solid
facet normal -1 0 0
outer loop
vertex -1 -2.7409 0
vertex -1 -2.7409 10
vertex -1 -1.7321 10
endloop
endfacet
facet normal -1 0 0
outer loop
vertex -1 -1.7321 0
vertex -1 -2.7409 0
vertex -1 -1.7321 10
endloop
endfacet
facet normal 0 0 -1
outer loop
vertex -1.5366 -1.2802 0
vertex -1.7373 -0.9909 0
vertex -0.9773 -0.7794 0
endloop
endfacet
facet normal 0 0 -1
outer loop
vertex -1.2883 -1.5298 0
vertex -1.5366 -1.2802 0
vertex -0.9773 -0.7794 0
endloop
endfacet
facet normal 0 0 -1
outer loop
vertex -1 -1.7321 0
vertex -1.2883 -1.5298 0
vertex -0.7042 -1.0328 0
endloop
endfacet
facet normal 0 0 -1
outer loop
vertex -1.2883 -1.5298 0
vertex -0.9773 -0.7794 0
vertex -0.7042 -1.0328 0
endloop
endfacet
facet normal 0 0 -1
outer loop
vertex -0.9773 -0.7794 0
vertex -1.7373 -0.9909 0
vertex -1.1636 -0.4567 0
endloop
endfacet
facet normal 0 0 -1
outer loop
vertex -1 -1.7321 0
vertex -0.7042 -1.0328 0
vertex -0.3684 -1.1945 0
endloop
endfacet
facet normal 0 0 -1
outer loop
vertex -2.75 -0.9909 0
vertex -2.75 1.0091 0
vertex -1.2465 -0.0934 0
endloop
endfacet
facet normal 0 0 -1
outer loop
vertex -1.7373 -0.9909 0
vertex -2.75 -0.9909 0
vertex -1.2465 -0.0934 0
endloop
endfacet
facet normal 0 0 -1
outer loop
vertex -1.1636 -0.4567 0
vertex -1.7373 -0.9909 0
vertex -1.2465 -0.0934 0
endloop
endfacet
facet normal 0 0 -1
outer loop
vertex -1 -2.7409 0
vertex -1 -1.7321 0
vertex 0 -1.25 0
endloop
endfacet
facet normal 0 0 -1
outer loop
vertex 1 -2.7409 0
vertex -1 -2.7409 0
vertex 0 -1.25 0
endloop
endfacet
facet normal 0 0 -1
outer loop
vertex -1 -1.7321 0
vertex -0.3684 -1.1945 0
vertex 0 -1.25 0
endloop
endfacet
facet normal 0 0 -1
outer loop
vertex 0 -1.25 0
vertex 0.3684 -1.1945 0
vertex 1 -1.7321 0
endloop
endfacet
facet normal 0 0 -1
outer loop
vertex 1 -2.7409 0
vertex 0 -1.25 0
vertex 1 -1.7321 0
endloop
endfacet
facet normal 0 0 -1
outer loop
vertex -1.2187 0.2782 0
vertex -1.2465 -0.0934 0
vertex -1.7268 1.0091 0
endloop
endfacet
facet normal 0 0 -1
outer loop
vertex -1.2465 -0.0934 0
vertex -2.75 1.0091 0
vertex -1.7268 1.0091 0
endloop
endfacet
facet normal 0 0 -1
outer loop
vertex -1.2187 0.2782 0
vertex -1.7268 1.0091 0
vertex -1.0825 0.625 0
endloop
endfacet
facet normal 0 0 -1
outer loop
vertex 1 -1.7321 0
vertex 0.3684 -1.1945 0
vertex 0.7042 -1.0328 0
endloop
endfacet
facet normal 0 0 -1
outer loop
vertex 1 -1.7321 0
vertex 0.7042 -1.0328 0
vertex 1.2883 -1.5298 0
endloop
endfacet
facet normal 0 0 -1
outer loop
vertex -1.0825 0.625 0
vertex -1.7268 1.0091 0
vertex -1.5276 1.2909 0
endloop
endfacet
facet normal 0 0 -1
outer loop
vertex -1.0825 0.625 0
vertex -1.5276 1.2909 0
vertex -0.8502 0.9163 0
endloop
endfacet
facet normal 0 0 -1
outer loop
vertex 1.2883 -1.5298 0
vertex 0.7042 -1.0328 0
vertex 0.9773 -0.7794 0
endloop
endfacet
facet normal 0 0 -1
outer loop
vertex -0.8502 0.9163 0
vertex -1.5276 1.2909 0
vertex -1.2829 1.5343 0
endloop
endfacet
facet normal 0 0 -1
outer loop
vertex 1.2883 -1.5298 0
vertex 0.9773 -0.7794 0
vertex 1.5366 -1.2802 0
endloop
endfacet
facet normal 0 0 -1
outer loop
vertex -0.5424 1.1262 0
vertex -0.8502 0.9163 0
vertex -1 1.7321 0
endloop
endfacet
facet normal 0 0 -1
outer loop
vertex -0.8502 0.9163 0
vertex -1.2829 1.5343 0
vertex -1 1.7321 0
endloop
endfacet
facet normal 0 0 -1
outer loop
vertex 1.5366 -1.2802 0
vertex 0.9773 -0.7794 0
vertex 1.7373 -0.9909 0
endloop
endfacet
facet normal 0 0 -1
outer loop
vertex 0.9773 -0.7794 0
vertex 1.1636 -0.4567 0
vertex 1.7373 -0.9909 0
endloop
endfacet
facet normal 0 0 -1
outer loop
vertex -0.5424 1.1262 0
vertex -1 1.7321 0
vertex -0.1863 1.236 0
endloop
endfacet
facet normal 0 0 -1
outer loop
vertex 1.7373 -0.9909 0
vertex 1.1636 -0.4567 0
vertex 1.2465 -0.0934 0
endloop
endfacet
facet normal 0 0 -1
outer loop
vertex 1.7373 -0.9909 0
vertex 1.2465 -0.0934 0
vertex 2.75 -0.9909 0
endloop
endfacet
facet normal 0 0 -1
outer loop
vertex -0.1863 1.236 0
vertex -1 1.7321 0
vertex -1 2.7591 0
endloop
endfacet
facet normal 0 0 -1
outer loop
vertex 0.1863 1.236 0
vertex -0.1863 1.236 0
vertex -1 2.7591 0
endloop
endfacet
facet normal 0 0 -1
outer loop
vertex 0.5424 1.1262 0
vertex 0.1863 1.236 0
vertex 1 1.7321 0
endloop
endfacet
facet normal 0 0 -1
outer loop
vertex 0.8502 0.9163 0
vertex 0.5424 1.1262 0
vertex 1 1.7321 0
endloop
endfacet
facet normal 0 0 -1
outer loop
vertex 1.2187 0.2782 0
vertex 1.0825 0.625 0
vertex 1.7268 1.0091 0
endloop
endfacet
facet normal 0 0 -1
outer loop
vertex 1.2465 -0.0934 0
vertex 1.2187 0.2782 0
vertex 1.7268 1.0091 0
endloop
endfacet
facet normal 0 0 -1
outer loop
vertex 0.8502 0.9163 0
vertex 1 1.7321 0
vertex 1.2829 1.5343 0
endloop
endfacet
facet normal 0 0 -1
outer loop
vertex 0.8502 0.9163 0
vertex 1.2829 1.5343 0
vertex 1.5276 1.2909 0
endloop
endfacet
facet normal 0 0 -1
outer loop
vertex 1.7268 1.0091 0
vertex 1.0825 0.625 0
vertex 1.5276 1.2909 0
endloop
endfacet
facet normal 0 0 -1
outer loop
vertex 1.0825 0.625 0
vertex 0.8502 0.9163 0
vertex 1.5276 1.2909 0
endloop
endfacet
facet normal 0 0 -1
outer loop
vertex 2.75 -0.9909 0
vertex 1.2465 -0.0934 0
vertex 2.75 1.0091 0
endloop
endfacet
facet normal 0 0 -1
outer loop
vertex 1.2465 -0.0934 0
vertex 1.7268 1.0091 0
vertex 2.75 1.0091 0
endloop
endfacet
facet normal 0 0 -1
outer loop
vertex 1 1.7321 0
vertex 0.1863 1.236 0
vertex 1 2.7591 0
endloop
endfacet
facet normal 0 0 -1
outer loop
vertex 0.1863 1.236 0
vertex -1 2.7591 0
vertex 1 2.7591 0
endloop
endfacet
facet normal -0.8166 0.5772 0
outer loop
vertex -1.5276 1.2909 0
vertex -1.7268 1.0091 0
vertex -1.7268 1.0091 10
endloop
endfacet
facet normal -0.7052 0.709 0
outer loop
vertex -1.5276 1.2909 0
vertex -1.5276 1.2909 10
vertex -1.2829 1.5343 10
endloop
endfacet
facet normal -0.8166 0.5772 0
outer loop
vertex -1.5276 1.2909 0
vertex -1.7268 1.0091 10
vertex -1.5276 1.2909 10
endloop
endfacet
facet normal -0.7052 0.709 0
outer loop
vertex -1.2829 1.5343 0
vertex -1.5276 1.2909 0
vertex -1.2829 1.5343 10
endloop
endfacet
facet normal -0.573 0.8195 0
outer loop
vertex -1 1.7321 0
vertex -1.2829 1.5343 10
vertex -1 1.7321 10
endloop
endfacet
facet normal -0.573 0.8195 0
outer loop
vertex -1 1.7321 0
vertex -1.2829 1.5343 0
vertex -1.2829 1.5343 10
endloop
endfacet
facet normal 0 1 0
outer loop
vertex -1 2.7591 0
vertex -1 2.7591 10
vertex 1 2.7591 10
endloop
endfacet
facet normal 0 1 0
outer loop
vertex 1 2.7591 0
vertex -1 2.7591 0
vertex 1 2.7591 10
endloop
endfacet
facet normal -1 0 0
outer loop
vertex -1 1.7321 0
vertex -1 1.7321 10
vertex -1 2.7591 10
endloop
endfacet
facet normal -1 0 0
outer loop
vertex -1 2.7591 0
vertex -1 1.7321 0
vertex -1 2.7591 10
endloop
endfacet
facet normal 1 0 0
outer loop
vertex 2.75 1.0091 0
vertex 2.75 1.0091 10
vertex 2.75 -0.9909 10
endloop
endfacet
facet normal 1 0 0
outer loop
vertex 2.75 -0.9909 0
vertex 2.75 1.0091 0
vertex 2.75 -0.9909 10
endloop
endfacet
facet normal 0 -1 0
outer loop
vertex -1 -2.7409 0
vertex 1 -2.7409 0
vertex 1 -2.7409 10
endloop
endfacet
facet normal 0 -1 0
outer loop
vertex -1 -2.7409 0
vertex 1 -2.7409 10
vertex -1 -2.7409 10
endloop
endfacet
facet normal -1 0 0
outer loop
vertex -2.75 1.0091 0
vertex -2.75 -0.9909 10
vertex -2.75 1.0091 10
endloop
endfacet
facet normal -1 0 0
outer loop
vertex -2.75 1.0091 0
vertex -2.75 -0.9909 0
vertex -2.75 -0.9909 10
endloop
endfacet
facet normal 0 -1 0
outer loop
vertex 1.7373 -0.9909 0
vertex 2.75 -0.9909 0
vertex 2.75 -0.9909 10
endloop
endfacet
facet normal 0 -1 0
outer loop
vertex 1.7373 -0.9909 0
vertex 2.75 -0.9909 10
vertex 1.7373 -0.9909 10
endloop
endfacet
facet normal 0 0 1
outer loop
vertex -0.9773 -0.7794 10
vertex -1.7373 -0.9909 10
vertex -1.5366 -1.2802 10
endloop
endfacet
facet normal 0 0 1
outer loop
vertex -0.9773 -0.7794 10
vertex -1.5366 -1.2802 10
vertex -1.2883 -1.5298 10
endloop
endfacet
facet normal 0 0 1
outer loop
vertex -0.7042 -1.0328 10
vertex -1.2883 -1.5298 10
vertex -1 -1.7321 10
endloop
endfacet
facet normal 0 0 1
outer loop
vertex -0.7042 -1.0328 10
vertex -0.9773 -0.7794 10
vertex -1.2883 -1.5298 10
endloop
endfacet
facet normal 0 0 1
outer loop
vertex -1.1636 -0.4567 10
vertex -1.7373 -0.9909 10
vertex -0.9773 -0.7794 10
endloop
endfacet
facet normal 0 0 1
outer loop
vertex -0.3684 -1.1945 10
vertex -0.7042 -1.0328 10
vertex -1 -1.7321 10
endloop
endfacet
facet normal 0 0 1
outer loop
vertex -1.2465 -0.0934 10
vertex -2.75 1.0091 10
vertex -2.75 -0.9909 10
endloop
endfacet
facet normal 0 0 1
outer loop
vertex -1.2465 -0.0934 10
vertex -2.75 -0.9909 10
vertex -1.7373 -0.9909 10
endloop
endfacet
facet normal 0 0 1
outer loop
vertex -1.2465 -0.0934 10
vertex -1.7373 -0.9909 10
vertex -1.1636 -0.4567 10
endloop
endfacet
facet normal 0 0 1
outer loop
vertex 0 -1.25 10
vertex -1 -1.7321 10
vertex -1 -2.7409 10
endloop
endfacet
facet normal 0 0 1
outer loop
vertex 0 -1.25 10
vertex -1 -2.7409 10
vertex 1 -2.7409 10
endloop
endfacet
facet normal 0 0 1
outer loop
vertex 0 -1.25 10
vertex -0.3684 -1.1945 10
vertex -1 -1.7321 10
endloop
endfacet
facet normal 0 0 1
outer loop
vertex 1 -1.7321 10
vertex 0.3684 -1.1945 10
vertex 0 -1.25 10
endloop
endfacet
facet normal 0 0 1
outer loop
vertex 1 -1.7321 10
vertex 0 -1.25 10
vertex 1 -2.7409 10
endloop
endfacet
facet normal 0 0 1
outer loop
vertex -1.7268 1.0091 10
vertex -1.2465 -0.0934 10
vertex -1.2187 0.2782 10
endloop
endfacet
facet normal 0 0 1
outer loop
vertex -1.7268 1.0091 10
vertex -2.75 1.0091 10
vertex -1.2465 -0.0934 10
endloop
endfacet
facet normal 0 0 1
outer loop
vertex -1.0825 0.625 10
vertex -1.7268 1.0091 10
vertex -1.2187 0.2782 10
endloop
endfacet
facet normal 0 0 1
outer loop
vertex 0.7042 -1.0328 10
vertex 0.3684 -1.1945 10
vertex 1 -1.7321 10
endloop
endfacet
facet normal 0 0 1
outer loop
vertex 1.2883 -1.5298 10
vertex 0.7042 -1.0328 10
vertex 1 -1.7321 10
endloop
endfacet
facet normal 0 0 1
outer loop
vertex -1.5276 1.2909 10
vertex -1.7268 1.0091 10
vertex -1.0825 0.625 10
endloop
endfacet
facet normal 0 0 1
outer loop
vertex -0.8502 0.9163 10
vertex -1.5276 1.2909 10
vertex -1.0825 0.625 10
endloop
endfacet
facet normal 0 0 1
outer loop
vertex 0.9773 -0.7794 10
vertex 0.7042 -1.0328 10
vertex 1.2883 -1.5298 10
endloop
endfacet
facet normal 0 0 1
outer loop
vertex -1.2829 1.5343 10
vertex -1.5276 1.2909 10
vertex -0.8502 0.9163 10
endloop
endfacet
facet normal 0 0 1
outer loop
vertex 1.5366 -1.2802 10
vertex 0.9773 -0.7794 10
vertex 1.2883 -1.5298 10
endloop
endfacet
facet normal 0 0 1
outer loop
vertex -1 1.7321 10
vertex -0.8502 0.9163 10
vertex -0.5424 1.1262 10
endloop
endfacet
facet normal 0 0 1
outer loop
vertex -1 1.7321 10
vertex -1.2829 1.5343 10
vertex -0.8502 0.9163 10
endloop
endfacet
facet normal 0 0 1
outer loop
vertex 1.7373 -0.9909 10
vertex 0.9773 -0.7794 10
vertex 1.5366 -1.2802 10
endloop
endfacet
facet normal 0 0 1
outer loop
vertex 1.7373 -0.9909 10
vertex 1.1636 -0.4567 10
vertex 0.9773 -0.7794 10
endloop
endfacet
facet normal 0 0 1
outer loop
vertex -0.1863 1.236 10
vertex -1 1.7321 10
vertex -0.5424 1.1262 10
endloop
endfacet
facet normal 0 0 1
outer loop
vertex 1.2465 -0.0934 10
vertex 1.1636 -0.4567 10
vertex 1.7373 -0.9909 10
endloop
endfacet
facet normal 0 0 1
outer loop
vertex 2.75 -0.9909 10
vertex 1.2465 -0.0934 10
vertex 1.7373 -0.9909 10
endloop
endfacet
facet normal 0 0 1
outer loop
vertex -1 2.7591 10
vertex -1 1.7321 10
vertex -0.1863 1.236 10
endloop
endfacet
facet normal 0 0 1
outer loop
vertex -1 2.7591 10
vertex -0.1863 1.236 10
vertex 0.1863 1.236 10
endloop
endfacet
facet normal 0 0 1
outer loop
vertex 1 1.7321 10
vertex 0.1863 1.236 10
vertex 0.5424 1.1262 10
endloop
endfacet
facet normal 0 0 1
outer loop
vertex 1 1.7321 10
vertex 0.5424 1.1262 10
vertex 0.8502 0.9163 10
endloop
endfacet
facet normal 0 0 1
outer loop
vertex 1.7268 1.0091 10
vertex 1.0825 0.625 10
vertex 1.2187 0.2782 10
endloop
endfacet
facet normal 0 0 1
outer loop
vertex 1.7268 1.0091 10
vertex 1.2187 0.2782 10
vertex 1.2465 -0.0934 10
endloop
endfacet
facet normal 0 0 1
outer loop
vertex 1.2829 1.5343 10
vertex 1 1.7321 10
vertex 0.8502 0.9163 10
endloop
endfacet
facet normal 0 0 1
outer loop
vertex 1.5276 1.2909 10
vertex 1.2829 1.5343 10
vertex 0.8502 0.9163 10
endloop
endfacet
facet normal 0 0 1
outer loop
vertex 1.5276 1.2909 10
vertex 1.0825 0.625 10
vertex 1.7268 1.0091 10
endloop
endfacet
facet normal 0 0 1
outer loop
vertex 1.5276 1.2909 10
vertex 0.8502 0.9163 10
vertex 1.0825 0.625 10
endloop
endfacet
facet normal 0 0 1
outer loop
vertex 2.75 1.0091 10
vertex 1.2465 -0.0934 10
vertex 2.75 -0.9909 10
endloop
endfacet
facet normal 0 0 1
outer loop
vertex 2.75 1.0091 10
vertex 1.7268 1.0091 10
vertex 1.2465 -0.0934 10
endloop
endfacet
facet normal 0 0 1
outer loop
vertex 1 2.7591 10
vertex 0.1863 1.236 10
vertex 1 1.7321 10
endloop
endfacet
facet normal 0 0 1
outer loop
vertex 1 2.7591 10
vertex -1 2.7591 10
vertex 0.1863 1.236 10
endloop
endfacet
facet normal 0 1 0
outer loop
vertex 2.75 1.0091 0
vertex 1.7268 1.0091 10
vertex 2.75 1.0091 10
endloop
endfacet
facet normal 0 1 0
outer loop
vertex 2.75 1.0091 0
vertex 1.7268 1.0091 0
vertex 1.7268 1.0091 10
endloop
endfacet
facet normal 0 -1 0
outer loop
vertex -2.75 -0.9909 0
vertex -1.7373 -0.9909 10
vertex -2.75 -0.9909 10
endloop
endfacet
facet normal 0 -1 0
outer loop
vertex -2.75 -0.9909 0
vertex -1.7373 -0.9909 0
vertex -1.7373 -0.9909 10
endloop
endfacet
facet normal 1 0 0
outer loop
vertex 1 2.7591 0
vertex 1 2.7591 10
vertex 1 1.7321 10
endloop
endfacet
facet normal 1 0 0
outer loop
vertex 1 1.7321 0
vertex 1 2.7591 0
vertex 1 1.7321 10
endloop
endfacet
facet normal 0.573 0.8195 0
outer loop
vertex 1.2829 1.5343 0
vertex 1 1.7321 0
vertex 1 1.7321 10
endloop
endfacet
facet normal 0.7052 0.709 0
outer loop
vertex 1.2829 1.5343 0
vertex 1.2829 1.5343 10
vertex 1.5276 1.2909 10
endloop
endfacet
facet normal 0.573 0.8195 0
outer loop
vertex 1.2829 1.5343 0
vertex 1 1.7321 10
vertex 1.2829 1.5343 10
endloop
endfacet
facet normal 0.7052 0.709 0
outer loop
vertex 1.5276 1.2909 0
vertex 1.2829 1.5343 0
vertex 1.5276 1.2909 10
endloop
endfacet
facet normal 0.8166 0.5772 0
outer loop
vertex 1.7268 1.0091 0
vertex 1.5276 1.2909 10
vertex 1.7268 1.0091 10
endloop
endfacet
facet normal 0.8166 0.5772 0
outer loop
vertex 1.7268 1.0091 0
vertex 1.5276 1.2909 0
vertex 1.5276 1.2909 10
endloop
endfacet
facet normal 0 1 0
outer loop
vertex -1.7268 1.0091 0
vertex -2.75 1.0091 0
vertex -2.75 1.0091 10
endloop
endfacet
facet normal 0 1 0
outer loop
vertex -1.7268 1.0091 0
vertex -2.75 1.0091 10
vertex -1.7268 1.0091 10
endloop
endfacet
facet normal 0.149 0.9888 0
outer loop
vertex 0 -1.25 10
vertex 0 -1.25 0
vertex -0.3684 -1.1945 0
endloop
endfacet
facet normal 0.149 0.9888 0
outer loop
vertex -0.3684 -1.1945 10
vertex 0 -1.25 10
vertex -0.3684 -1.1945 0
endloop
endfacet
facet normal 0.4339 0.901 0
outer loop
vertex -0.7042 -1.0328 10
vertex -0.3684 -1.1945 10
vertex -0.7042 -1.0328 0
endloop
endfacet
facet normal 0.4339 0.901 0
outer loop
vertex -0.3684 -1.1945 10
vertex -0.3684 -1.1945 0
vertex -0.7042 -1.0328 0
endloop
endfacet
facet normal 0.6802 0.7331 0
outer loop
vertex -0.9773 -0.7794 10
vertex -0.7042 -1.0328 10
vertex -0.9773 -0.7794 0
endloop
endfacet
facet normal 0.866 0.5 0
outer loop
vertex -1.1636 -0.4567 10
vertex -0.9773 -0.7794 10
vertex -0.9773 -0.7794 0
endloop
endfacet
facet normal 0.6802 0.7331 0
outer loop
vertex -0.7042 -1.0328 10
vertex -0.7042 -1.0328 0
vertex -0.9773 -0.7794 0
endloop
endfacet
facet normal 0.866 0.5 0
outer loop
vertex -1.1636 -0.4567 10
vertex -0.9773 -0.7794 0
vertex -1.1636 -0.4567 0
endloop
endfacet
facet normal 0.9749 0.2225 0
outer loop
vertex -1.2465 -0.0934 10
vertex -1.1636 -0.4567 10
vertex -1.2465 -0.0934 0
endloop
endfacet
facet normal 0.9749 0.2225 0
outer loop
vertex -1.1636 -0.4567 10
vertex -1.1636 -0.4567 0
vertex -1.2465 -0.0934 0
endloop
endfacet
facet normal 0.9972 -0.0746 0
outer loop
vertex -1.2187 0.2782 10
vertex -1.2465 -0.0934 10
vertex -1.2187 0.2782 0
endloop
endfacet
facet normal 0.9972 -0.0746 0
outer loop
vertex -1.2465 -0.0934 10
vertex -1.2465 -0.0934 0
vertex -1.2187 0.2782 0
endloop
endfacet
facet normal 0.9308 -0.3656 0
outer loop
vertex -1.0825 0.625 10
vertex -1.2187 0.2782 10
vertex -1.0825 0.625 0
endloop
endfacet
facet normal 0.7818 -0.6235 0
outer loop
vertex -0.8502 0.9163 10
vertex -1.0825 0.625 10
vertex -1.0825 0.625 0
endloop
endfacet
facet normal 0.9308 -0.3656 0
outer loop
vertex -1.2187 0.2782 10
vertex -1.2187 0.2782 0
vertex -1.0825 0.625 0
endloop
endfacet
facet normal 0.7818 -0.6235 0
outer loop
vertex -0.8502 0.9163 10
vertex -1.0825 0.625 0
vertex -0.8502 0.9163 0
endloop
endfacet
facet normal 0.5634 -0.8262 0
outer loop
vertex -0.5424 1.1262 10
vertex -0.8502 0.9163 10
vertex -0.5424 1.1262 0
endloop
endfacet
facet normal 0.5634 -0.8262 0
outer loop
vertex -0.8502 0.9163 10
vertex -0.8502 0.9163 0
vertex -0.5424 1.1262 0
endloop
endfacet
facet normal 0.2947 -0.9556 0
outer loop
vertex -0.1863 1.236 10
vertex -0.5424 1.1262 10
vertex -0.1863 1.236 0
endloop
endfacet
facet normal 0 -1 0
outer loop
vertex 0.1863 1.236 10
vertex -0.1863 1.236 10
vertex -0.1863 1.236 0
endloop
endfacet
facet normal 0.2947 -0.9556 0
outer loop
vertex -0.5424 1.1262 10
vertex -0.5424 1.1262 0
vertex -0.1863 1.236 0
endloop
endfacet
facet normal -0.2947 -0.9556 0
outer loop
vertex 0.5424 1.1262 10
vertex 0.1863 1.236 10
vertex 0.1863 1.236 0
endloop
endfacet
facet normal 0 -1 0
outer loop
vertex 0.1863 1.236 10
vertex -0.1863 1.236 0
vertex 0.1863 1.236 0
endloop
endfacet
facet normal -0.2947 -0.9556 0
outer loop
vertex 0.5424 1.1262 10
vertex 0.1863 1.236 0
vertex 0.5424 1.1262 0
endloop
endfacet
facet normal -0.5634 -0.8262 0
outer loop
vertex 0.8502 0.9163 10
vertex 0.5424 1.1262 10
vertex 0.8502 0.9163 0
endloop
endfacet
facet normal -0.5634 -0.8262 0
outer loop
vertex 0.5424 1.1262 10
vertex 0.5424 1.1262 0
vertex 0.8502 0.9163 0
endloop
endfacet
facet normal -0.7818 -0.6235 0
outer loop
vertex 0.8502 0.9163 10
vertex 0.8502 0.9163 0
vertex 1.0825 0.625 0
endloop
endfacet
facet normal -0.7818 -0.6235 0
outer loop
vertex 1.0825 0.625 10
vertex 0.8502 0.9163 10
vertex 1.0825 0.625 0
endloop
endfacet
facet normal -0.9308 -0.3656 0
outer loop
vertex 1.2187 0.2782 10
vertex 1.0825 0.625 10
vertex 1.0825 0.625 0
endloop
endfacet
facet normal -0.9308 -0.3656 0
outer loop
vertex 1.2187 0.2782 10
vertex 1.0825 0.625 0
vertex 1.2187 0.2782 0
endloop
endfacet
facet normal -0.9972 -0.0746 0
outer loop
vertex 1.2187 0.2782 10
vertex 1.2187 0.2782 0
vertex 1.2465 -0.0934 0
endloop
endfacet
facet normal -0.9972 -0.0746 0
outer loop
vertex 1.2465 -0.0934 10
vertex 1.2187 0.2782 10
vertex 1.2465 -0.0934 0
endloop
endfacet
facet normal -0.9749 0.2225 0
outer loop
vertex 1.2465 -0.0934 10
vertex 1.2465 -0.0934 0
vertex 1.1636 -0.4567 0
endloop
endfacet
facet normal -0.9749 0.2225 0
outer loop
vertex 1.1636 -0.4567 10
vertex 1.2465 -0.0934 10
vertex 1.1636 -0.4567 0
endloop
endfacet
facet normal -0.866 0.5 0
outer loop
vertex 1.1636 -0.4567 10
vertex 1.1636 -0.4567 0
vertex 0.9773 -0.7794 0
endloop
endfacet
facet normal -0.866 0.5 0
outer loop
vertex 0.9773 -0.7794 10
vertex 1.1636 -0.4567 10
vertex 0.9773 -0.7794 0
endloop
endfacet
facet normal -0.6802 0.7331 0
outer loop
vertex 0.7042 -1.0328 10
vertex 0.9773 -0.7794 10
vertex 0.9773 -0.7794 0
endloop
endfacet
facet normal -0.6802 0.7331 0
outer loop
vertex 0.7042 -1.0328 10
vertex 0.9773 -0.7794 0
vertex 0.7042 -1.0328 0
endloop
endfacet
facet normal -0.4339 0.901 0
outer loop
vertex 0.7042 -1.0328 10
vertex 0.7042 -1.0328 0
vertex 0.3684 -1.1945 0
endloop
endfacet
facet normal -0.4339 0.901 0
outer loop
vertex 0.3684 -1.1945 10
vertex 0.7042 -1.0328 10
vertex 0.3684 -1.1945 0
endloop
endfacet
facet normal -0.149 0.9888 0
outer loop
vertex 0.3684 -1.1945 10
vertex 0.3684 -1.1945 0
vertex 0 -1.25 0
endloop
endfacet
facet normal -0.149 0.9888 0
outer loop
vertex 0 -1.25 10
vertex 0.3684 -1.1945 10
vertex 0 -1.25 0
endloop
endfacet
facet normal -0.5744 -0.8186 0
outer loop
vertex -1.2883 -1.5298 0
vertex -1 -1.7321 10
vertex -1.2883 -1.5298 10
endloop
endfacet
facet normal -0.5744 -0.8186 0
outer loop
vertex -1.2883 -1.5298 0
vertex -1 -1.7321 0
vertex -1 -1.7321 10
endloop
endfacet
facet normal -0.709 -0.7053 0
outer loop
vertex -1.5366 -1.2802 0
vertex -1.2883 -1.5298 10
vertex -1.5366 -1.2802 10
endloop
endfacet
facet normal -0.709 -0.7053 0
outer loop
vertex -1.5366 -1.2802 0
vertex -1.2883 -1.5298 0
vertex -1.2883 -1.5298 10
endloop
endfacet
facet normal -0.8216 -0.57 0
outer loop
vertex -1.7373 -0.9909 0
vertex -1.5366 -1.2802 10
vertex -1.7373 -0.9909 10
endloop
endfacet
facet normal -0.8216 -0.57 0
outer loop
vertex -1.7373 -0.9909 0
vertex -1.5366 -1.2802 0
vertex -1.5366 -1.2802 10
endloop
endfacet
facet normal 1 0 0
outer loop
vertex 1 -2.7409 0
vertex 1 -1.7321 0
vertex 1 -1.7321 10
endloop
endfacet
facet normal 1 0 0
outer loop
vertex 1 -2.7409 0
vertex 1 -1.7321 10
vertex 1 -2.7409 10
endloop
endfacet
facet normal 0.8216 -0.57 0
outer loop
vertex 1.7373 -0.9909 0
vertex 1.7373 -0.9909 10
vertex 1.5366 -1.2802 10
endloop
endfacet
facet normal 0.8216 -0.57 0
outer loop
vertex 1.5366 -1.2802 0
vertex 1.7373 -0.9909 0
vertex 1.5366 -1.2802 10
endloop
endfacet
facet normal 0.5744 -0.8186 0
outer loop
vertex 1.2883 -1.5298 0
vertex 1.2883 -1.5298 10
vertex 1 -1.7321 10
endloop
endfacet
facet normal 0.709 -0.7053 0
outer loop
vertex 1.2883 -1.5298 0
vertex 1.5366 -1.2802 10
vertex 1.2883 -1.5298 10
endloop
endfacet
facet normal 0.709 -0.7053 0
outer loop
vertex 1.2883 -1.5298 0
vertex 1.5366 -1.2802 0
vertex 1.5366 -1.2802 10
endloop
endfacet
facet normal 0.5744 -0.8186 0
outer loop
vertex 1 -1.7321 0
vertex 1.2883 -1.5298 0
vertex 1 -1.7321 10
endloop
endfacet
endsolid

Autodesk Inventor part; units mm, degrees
ref_plane "YZ Plane" through (0, 0, 0) normal (1, 0, 0) x (0, 1, 0)
ref_plane "XZ Plane" through (0, 0, 0) normal (0, 1, 0) x (-1, 0, 0)
sketch "Boceto3" plane through (0, 0, 0) normal (0, 0, 1) x (1, 0, 0)
  circle A0 centre (0, 0) radius 2
  dimension "d13" = 4
sketch "Boceto1" plane through (0, 0, 0) normal (0, 0, 1) x (1, 0, 0)
  line L0 (-1, 2.7591) -> (1, 2.7591)
  line L1 (1, 2.7591) -> (1, -2.7409)
  line L2 (1, -2.7409) -> (-1, -2.7409)
  line L3 (-1, -2.7409) -> (-1, 2.7591)
  line L4 (0, 5.941) -> (0, -7.9228)
  line L5 (-6.4273, 0.0091) -> (13.1091, 0.0091)
  line L6 (-2.75, 1.0091) -> (2.75, 1.0091)
  line L7 (2.75, 1.0091) -> (2.75, -0.9909)
  line L8 (2.75, -0.9909) -> (-2.75, -0.9909)
  line L9 (-2.75, -0.9909) -> (-2.75, 1.0091)
  point P0 (0, 0)
  point P1 (0, 2.7591)
  point P2 (1, 0.0091)
  point P3 (-2.75, 0.0091)
  point P4 (0, -0.9909)
  dimension "d0" = 2
  dimension "d1" = 5.5
  dimension "d2" = 5.5
  dimension "d3" = 2
ref_plane "Plano de trabajo1" through (0, 0, 11) normal (0, 0, 1) x (1, 0, 0)
extrude "Extrusión2" add sketch "Boceto1" along normal blind 10
extrude "Extrusión3" add sketch "Boceto3" along normal blind 10
sketch "Boceto2" plane through (0, 0, 10) normal (0, 0, 1) x (1, 0, 0)
  point P0 (0, 0)
  point P1 (0, 0)
hole "Agujero1" at (0, 0, 10) direction (0, 0, -1) diameter 2.5 end through all
properties part number "motor_axis_cross_2.5" material "Plástico ABS"
